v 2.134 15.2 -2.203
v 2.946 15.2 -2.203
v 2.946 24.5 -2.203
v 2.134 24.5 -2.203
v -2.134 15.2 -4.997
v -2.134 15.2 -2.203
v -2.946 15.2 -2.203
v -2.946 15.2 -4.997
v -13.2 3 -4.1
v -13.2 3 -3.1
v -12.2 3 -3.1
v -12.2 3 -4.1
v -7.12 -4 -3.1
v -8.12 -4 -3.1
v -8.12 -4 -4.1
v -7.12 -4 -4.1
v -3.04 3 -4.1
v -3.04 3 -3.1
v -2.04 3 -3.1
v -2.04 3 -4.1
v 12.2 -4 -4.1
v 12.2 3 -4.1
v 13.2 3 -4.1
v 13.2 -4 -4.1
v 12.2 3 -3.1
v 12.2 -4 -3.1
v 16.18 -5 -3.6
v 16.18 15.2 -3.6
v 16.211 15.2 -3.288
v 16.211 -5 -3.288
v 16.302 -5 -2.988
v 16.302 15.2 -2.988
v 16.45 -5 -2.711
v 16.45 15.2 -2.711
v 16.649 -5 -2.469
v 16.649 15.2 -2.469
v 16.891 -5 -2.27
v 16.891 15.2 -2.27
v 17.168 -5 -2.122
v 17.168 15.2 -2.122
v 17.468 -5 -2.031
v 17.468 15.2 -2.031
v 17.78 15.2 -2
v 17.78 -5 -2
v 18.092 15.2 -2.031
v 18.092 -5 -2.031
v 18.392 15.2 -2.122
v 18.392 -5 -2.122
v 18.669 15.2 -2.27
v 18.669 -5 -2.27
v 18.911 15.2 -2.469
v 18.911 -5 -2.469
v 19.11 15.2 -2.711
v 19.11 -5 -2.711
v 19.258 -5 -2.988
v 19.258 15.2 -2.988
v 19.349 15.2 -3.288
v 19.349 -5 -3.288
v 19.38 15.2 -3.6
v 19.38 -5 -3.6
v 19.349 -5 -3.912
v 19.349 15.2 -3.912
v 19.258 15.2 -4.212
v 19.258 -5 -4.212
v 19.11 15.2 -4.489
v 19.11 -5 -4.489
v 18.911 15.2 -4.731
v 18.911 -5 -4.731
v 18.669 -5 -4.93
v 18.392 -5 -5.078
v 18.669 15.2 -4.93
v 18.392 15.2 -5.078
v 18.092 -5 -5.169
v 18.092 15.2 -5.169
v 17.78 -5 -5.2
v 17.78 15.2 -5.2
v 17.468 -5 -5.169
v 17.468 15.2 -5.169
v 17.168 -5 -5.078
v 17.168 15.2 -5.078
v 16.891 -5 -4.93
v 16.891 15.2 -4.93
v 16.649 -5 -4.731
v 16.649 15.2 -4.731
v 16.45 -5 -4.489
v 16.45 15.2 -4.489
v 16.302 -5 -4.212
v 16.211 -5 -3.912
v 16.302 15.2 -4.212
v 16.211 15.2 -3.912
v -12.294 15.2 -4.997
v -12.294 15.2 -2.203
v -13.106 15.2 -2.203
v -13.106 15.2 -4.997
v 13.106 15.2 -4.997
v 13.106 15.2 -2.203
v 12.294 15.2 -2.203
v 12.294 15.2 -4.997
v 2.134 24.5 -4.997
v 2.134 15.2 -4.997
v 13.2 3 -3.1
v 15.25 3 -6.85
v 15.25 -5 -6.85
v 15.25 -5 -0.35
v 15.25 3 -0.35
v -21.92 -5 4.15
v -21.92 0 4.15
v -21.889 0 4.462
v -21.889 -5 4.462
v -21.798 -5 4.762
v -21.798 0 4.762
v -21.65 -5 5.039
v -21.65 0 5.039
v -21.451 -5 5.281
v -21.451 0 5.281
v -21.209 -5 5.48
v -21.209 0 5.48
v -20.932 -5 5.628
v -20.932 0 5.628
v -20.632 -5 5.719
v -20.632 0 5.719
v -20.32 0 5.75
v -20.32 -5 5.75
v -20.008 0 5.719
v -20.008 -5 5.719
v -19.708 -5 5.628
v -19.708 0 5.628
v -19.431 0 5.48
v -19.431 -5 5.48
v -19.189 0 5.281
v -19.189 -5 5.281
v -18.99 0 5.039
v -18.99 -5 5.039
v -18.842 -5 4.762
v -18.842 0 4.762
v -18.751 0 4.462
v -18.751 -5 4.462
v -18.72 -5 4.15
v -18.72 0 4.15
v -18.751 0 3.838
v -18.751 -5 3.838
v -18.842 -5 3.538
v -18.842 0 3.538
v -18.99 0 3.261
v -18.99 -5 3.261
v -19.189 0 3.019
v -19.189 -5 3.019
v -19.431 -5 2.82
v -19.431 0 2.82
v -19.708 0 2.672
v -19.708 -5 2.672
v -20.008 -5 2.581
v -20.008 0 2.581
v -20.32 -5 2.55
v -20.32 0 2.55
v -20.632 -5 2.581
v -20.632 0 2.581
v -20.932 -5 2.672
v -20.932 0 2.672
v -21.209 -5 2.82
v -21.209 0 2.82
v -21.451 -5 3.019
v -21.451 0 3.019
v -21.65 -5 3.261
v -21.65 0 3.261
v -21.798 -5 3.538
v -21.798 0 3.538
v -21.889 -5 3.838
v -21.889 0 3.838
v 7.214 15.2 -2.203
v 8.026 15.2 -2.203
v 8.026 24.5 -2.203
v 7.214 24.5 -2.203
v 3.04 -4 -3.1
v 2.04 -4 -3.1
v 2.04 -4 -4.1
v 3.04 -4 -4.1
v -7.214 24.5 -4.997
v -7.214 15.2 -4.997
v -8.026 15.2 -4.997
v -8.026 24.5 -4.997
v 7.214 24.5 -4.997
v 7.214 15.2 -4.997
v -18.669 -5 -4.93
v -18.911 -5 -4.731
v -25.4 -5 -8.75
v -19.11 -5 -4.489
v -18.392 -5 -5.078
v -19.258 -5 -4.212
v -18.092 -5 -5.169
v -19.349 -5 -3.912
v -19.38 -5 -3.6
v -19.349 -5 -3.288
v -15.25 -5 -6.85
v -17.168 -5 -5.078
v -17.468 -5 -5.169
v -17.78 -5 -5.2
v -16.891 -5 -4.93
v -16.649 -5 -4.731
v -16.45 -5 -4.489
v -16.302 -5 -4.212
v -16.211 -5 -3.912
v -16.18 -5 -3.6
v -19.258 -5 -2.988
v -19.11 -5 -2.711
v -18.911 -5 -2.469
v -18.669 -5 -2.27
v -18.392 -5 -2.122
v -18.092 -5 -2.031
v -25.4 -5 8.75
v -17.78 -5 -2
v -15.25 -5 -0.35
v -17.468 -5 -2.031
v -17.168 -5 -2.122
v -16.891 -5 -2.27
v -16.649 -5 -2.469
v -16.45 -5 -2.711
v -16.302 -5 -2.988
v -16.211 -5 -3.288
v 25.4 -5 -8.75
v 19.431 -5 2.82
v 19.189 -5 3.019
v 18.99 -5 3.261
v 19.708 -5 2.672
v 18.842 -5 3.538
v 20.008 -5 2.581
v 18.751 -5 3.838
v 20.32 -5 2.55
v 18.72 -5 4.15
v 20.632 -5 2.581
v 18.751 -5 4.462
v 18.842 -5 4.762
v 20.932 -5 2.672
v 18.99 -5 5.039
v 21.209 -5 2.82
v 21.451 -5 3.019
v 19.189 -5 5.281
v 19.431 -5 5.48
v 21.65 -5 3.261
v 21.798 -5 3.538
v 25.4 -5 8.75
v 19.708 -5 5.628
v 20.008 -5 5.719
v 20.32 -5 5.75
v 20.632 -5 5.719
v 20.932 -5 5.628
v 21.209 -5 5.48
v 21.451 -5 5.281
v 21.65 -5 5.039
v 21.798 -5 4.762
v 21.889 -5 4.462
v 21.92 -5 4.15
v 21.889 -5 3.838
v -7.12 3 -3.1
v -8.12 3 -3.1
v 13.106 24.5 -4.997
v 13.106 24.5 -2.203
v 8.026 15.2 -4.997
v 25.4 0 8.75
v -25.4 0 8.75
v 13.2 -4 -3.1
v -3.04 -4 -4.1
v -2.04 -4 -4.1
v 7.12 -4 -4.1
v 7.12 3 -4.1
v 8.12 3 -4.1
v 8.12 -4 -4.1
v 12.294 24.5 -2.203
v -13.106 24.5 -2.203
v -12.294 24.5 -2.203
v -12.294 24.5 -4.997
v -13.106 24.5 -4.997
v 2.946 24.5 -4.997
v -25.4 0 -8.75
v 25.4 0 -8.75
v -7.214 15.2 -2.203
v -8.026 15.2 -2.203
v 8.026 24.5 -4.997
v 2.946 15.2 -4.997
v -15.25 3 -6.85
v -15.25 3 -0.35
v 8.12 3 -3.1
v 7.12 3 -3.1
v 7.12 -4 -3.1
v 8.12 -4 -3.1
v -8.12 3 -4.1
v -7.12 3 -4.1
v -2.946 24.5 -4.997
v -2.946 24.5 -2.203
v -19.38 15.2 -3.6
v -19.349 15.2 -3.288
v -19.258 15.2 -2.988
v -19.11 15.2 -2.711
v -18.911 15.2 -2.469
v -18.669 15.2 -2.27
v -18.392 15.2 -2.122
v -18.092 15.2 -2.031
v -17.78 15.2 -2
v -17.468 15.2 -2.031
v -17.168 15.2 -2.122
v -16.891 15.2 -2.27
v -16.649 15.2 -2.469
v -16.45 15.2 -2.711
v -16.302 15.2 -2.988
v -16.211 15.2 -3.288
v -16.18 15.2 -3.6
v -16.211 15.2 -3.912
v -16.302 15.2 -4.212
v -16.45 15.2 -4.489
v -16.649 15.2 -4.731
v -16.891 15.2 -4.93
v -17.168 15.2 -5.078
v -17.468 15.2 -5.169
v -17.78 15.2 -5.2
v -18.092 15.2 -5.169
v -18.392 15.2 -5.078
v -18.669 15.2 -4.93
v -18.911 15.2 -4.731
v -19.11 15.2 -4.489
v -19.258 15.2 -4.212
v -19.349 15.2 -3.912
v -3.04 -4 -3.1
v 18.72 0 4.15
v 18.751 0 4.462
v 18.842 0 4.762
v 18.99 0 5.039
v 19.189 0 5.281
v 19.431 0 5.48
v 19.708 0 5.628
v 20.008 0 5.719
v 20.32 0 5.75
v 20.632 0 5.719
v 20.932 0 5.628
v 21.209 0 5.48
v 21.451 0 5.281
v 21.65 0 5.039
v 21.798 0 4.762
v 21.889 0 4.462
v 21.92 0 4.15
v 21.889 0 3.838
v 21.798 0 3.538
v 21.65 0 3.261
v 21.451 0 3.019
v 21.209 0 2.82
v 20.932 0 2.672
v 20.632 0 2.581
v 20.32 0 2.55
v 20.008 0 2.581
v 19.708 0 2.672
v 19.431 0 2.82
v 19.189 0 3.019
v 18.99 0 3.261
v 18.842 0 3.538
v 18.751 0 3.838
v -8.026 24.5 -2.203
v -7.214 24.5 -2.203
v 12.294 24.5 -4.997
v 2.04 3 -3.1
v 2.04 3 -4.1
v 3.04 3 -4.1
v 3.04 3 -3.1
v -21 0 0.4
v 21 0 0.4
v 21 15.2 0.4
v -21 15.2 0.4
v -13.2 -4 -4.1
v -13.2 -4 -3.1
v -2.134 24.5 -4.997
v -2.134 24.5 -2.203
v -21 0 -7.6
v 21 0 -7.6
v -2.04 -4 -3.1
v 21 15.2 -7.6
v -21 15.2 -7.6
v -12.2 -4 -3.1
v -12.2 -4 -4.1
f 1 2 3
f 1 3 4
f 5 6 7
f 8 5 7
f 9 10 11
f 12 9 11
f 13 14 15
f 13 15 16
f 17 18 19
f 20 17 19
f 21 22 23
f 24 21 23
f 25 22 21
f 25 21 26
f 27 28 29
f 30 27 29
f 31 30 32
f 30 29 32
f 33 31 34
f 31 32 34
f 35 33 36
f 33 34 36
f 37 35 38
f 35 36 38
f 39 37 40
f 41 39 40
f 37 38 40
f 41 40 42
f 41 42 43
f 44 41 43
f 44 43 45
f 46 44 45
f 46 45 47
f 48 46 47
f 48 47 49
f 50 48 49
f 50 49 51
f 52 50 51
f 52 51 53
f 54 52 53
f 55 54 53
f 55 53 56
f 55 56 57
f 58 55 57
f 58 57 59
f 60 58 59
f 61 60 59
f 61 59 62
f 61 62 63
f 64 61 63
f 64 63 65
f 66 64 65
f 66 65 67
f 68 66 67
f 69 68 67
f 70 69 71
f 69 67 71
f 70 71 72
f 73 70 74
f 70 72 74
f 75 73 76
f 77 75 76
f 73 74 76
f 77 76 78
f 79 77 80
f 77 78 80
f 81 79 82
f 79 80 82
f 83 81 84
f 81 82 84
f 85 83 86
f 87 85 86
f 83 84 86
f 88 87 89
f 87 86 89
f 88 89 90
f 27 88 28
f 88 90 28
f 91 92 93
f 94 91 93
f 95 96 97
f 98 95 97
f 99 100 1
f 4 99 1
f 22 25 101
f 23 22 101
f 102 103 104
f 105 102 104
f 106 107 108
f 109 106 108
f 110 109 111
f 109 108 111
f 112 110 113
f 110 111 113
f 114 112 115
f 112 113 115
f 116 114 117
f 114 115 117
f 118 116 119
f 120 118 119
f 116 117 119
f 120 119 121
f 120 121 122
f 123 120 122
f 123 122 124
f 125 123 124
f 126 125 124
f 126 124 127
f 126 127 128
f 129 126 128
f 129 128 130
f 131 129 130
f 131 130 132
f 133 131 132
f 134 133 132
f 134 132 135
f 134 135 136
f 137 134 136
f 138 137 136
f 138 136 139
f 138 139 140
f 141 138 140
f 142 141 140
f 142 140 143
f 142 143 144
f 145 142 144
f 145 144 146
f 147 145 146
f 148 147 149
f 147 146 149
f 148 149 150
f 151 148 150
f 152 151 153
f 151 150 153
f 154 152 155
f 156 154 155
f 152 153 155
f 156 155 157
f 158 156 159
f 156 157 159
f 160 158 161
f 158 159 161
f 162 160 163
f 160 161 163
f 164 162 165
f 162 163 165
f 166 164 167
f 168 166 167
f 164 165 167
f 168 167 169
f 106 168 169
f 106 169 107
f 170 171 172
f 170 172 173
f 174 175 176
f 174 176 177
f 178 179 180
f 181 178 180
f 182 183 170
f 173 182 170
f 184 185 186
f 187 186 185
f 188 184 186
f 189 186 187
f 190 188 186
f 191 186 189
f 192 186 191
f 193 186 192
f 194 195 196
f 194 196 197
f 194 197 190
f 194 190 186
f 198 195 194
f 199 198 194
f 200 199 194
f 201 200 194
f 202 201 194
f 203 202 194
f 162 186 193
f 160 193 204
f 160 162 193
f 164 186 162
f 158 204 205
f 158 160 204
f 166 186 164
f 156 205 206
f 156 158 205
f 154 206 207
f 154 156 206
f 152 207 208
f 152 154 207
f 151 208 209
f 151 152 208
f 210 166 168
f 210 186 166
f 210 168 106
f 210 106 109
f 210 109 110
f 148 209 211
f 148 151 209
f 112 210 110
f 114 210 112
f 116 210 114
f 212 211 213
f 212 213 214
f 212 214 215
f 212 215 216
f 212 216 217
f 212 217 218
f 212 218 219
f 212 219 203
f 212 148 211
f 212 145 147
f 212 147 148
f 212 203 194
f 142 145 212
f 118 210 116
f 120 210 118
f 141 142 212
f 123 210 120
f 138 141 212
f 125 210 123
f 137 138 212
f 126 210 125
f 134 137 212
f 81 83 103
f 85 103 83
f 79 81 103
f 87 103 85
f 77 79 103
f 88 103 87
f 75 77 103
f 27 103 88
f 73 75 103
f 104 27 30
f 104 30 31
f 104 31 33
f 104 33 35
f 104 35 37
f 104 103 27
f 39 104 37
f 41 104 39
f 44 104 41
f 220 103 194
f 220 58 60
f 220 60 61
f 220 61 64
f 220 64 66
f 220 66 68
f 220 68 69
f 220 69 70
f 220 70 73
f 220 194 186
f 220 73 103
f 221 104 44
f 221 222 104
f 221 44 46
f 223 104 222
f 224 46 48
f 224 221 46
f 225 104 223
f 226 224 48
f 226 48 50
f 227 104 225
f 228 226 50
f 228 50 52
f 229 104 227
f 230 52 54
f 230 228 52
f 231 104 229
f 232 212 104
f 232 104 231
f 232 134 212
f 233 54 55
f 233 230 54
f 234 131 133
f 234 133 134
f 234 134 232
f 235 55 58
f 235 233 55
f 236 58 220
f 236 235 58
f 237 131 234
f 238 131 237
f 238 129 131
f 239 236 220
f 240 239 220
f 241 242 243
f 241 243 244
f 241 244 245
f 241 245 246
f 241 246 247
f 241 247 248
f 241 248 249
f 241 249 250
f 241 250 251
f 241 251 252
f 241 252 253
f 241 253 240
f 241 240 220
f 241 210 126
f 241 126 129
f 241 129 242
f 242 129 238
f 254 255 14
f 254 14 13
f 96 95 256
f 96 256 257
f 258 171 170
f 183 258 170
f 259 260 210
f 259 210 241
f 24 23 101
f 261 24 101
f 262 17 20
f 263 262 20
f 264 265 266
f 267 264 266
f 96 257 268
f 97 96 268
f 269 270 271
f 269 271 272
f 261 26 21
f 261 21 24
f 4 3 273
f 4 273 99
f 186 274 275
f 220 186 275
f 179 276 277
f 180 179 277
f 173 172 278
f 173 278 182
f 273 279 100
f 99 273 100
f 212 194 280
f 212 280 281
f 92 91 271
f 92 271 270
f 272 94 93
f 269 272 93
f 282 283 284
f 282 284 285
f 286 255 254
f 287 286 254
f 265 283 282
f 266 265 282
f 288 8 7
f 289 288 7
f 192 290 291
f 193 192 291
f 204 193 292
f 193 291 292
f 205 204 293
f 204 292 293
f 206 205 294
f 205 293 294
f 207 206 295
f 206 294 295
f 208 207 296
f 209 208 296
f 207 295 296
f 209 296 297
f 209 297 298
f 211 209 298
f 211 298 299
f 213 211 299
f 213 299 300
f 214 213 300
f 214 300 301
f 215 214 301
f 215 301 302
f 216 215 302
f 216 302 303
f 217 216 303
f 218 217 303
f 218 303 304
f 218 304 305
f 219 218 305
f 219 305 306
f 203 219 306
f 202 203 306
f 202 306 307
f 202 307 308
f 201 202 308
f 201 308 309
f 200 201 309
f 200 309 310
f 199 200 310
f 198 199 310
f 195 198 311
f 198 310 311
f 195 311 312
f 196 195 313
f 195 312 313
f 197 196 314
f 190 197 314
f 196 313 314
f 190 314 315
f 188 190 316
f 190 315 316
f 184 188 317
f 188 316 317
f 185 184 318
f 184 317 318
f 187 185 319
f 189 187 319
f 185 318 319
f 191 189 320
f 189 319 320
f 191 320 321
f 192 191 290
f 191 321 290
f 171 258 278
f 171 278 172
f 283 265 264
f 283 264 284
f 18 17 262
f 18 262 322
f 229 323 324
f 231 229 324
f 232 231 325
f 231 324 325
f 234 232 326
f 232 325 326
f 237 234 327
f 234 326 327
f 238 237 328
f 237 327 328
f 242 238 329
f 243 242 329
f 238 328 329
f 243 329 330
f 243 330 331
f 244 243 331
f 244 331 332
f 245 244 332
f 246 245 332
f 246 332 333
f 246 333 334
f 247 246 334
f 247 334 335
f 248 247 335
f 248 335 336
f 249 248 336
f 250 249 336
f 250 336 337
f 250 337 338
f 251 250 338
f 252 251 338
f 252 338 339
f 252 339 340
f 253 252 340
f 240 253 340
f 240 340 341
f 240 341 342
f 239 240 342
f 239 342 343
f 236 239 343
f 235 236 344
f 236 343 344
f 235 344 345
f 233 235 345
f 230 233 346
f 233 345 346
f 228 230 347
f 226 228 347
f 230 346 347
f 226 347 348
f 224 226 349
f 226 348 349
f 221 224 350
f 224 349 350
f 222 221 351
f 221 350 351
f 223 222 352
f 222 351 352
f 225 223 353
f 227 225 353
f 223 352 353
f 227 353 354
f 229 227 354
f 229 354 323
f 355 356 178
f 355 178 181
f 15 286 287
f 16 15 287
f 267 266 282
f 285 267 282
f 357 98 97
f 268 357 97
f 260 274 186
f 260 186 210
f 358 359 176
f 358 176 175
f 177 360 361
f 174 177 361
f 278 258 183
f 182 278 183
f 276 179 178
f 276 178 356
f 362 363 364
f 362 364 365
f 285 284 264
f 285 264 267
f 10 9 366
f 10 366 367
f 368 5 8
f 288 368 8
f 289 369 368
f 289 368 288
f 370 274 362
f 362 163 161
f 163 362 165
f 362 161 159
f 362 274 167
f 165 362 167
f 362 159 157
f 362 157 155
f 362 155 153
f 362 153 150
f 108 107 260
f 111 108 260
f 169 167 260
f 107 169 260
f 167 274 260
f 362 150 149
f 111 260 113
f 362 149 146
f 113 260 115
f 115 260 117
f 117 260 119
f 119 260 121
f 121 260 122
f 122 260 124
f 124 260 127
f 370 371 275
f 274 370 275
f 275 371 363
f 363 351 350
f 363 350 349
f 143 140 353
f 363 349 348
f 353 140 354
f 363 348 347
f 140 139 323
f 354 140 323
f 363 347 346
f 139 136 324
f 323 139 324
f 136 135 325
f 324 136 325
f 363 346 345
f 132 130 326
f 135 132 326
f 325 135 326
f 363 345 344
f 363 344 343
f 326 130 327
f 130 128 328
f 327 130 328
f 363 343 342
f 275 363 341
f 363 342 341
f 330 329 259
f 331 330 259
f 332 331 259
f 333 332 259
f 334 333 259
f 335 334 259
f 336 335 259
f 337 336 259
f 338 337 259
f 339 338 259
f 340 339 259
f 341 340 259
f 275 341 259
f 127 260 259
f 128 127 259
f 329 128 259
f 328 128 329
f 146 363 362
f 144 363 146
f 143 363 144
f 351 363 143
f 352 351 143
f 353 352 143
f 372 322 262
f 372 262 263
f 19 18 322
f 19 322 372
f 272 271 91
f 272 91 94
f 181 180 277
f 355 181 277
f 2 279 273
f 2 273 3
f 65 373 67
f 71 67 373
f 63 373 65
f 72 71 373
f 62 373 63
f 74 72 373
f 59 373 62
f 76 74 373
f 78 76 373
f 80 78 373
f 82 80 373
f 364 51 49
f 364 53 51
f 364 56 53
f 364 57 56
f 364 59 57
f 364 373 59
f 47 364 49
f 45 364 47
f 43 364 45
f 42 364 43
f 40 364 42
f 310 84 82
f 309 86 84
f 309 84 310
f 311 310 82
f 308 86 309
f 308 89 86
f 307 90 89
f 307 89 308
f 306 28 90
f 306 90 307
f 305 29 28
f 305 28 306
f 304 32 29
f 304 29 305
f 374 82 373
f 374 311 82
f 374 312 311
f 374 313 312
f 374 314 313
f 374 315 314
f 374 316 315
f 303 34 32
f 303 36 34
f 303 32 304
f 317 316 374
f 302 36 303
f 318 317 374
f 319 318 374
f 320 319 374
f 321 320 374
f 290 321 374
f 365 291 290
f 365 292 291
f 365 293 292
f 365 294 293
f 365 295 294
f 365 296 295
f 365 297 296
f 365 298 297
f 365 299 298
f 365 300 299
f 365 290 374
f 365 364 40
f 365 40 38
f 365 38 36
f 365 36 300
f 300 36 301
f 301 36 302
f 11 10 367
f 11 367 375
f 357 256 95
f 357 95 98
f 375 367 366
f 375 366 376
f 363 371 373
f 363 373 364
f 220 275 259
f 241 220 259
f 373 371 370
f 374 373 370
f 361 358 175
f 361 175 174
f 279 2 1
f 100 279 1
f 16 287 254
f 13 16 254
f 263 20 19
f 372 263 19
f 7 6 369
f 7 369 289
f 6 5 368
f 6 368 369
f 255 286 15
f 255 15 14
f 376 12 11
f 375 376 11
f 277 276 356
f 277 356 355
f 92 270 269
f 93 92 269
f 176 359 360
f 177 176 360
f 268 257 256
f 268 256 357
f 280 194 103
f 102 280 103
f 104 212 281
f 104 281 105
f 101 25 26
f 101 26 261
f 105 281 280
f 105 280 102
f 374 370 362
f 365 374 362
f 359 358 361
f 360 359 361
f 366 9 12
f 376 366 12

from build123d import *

# Parameters (mm, degrees)
F0_W      = 50.8
F0_H      = 17.5
F1_DEPTH  = 5
F3_W      = 42
F3_H      = 8
F4_DEPTH  = 15.2
F2_W      = 30.5
F2_H      = 6.5
F5_DEPTH  = 8
F7_D      = 3.2
F8_W      = 1
F8_H      = 1
F9_DEPTH  = 7
F10_W     = 0.8128
F10_H     = 2.794
F11_DEPTH = 9.3


with BuildPart() as f1:
    # F0 (on Front) → F1 (new body)
    with BuildSketch(Plane.XZ):
        Rectangle(F0_W, F0_H)
    extrude(amount=F1_DEPTH)

    # F3 (on face) → F4 (join)
    with BuildSketch(Plane(origin=(0, 0, 0), x_dir=(-1, 0, 0), z_dir=(0, 1, 0))):
        with Locations((0, -3.6)):
            Rectangle(F3_W, F3_H)
    extrude(amount=F4_DEPTH)

    # F2 (on face) → F5 (cut)
    with BuildSketch(Plane.XZ.offset(5)):
        with Locations((0, -3.6)):
            Rectangle(F2_W, F2_H)
    extrude(amount=-F5_DEPTH, mode=Mode.SUBTRACT)

    # F7 (through all)
    with Locations(Plane.XZ.offset(5)):
        with Locations((-20.32, 4.15), (-17.78, -3.6), (20.32, 4.15), (17.78, -3.6)):
            Hole(F7_D / 2)


with BuildPart() as f9:
    # F8 (on face) → F9 (new body)
    with BuildSketch(Plane.XZ.offset(-3)):
        with Locations((-12.7, -3.6)):
            Rectangle(F8_W, F8_H)
        with Locations((-7.62, -3.6)):
            Rectangle(F8_W, F8_H)
        with Locations((2.54, -3.6)):
            Rectangle(F8_W, F8_H)
        with Locations((-2.54, -3.6)):
            Rectangle(F8_W, F8_H)
        with Locations((7.62, -3.6)):
            Rectangle(F8_W, F8_H)
        with Locations((12.7, -3.6)):
            Rectangle(F8_W, F8_H)
    extrude(amount=F9_DEPTH)


with BuildPart() as f11:
    # F10 (on face) → F11 (new body)
    with BuildSketch(Plane(origin=(0, 15.2, 0), x_dir=(-1, 0, 0), z_dir=(0, 1, 0))):
        with Locations((-12.7, -3.6)):
            Rectangle(F10_W, F10_H)
        with Locations((-7.62, -3.6)):
            Rectangle(F10_W, F10_H)
        with Locations((-2.54, -3.6)):
            Rectangle(F10_W, F10_H)
        with Locations((2.54, -3.6)):
            Rectangle(F10_W, F10_H)
        with Locations((7.62, -3.6)):
            Rectangle(F10_W, F10_H)
        with Locations((12.7, -3.6)):
            Rectangle(F10_W, F10_H)
    extrude(amount=F11_DEPTH)


solid = Compound([f1.part, f9.part, f11.part])
